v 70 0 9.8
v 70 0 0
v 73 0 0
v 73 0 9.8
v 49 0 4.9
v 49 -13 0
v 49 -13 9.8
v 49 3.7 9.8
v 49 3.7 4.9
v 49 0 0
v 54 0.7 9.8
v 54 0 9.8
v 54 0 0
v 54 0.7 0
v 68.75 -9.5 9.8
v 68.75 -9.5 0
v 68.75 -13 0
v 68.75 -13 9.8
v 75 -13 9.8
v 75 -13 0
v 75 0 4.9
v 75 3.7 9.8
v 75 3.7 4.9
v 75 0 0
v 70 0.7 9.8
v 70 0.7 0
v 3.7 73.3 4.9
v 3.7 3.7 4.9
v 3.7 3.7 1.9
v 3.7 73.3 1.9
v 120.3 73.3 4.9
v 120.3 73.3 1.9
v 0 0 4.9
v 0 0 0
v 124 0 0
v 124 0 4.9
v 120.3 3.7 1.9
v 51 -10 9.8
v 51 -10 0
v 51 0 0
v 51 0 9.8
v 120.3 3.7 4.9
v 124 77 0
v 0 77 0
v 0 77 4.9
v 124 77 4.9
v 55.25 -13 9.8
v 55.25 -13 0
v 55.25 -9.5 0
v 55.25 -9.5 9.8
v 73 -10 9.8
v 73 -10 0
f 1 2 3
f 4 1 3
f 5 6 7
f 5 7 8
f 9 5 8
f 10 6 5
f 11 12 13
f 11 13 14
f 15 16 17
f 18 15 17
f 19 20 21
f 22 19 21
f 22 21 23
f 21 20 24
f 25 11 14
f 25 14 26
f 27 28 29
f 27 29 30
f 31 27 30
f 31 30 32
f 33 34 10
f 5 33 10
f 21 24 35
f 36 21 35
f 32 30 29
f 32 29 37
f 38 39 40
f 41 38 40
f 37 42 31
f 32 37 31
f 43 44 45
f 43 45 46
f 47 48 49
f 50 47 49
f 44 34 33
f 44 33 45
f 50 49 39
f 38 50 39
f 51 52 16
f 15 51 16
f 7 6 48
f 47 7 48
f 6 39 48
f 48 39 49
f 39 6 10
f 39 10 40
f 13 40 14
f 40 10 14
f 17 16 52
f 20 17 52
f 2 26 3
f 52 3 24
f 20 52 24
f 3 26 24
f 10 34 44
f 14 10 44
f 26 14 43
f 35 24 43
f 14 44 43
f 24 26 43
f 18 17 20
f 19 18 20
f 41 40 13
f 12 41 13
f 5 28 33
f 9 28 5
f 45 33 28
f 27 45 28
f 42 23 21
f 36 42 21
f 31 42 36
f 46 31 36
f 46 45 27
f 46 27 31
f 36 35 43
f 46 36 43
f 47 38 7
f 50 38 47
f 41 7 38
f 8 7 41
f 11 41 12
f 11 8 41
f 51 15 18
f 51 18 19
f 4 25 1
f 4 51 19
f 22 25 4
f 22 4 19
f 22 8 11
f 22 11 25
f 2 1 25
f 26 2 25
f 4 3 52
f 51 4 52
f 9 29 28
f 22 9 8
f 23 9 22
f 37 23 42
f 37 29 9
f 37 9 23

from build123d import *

# Parameters (mm, degrees)
F0_W     = 124
F0_H     = 77
F1_DEPTH = 4.9
F2_W     = 116.6
F2_H     = 69.6
F3_DEPTH = 3
F5_DEPTH = 9.8
F6_W     = 26
F6_H     = 3.7
F7_DEPTH = 4.9
F8_W     = 16
F8_H     = 0.7
F9_DEPTH = 25


with BuildPart() as f1:
    # F0 (on Top) → F1 (new body)
    with BuildSketch(Plane.XY):
        with Locations((62, 38.5)):
            Rectangle(F0_W, F0_H)
    extrude(amount=F1_DEPTH)

    # F2 (on face) → F3 (cut)
    with BuildSketch(Plane.XY.offset(4.9)):
        with Locations((62, 38.5)):
            Rectangle(F2_W, F2_H)
    extrude(amount=-F3_DEPTH, mode=Mode.SUBTRACT)

    # F4 (on Top) → F5 (join)
    with BuildSketch(Plane.XY):
        Polygon((51, -10), (51, 0), (49, 0), (49, -13), (55.25, -13), (55.25, -9.5), align=None)
        Polygon((68.75, -9.5), (68.75, -13), (75, -13), (75, 0), (73, 0), (73, -10), align=None)
    extrude(amount=F5_DEPTH)

    # F6 (on face) → F7 (join, through all)
    with BuildSketch(Plane.XY.offset(4.9)):
        with Locations((62, 1.85)):
            Rectangle(F6_W, F6_H)
    extrude(amount=F7_DEPTH)

    # F8 (on face) → F9 (cut)
    with BuildSketch(Plane.XY.offset(9.8)):
        with Locations((62, 0.35)):
            Rectangle(F8_W, F8_H)
    extrude(amount=-F9_DEPTH, mode=Mode.SUBTRACT)


solid = f1.part
